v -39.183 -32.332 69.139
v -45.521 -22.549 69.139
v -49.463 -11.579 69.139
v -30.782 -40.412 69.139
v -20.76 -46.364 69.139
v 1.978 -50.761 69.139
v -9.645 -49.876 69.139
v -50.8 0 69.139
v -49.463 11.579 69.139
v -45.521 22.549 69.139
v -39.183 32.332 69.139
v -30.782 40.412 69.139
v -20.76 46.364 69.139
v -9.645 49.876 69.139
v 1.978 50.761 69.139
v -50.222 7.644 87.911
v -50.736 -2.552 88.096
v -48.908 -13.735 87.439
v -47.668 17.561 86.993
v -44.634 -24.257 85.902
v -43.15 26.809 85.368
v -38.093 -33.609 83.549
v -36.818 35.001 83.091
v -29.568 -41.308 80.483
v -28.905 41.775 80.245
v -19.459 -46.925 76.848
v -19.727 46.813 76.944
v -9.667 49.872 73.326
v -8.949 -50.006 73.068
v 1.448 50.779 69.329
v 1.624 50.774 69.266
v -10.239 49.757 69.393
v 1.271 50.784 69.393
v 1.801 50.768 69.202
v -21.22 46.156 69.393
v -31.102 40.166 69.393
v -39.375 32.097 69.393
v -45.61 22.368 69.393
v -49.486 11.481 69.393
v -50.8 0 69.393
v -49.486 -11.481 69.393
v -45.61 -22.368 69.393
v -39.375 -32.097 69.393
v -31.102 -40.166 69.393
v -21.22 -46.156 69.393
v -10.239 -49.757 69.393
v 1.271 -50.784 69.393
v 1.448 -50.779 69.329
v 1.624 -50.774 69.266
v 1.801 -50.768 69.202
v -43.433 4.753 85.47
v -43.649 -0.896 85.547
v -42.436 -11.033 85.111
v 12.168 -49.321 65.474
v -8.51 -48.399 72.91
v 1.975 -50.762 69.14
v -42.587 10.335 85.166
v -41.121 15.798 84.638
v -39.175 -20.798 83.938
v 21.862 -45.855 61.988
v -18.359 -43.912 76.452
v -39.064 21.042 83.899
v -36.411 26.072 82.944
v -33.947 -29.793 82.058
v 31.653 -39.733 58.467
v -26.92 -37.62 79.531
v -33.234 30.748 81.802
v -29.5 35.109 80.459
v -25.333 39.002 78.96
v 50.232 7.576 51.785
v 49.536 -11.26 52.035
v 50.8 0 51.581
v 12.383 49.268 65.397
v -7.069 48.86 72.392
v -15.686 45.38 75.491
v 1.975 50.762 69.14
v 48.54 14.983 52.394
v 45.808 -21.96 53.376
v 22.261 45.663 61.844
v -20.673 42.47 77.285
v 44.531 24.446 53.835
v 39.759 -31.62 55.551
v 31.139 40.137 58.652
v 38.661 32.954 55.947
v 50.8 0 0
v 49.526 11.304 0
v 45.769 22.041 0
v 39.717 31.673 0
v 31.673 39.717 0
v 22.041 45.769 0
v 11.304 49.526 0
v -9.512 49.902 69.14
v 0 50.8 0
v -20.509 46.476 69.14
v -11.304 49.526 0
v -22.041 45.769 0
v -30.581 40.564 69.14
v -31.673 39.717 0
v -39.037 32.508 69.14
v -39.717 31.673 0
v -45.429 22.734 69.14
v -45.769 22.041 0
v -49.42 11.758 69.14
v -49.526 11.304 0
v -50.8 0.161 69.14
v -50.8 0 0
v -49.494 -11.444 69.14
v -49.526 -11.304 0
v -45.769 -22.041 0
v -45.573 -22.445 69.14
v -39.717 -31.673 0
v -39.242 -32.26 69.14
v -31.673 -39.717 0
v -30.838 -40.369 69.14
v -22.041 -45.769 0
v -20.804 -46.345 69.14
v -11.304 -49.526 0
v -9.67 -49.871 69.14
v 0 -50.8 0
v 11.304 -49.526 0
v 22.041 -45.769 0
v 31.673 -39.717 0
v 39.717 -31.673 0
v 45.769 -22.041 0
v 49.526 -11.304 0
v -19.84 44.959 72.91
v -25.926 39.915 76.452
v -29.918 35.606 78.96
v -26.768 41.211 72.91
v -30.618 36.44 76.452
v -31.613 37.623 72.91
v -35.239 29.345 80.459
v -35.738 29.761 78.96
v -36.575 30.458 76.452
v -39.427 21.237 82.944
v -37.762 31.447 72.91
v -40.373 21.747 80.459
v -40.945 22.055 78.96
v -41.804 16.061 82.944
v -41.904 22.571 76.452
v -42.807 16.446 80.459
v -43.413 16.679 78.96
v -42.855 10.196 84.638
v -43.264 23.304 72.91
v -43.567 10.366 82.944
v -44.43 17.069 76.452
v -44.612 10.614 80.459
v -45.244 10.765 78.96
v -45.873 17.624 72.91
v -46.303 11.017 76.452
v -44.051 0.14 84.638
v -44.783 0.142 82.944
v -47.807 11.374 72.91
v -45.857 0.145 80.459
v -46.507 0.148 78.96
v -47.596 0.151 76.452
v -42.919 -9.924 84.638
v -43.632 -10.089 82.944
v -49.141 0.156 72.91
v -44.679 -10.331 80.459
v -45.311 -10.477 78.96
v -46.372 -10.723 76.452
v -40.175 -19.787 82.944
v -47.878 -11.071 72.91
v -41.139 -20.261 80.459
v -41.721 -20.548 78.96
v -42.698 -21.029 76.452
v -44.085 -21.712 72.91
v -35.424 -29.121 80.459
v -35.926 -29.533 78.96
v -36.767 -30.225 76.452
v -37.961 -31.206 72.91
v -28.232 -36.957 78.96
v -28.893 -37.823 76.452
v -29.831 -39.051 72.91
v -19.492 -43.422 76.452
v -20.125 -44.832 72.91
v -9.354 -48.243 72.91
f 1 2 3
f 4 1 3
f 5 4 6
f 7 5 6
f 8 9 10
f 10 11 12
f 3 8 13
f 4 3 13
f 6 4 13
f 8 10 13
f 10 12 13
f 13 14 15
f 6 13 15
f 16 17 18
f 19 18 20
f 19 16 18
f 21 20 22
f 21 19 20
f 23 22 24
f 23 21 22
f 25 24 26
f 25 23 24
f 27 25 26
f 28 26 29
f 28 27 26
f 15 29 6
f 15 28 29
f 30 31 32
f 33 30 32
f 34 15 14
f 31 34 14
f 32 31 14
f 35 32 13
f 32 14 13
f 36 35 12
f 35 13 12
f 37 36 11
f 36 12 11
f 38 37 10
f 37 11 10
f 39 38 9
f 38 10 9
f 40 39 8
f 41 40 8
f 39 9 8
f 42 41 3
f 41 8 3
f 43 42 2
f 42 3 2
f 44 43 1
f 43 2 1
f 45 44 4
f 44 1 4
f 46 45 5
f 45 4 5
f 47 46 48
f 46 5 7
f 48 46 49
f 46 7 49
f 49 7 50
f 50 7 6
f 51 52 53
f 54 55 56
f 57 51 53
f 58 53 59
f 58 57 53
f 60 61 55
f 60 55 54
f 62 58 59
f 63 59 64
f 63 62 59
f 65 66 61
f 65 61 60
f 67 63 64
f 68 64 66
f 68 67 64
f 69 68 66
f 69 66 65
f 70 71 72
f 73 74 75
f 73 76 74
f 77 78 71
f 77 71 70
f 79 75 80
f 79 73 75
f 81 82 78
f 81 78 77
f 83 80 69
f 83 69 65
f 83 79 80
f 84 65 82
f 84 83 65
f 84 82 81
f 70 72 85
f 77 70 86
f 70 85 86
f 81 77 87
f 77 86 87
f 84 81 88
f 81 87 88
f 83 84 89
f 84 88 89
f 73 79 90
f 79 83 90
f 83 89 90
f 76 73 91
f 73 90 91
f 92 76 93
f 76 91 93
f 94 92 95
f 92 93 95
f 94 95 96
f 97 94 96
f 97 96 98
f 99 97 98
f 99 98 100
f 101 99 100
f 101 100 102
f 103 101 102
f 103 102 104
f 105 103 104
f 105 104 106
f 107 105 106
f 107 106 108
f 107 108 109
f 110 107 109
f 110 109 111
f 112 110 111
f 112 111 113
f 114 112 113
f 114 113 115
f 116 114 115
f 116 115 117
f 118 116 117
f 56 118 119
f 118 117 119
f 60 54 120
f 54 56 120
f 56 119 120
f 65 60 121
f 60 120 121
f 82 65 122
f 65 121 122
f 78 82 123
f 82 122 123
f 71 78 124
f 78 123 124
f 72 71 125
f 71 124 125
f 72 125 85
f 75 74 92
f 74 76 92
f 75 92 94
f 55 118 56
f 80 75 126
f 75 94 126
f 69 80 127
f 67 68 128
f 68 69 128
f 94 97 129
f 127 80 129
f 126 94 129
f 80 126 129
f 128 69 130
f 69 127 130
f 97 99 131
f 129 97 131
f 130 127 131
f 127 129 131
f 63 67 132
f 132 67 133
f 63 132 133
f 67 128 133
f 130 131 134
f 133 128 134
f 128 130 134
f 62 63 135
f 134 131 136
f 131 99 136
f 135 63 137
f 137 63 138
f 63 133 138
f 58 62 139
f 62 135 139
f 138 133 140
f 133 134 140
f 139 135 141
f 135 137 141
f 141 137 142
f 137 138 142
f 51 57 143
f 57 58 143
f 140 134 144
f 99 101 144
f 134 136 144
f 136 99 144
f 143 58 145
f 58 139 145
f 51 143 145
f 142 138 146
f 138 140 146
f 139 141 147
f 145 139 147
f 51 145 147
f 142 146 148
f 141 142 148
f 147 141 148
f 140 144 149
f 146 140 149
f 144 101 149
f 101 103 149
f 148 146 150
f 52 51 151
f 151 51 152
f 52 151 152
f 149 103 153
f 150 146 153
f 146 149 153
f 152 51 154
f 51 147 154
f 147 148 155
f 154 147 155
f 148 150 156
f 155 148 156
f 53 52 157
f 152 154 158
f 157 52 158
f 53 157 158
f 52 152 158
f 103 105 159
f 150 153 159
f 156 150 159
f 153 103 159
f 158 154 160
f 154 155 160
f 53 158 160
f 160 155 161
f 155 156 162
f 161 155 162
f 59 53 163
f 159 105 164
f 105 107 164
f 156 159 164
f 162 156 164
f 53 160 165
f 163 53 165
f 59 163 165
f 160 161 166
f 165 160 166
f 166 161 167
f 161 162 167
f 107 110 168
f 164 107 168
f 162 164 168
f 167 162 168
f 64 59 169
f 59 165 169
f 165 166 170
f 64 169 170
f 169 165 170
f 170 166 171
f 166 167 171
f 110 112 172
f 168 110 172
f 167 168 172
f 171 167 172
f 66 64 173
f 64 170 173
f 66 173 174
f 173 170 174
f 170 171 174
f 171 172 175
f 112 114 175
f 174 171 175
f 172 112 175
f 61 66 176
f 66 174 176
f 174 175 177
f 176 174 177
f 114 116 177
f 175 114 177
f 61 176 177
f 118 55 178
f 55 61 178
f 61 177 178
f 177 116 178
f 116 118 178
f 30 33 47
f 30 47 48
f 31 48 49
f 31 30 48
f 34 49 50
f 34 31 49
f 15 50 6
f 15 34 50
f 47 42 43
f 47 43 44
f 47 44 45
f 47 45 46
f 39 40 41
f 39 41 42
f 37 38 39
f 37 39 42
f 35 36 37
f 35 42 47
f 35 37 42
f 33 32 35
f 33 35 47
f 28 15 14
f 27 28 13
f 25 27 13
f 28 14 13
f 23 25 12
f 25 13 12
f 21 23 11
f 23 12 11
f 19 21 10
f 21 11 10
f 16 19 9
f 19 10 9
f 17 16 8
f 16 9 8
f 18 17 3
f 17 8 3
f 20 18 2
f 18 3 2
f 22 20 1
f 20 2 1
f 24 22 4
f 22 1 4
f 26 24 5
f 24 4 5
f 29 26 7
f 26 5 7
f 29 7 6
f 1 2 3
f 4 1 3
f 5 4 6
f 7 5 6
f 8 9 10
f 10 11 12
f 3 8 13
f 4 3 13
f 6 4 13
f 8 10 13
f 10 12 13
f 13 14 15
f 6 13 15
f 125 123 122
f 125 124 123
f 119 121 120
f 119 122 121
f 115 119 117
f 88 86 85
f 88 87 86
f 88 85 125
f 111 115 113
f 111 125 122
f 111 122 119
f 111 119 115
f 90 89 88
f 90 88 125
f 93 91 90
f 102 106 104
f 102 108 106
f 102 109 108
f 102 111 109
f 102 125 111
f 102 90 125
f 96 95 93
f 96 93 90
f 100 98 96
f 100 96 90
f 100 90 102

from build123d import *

# Parameters (mm, degrees)
F4_R           = 164.6055242693
F4_R_2         = 50.8
F5_DEPTH       = 228.6
F6_DEPTH       = 76.2
F7_DEPTH       = 76.2
F1_FACE_R      = 50.8
F9_R           = 50.8
F10_DEPTH      = 0.254
F13_R          = 50.8
F14_DEPTH      = 0.254
F15_R          = 50.8
F16_DEPTH      = 88.9
F17_DEPTH      = 76.2010001
F17_DEPTH_BACK = 76.2010001


with BuildPart() as f1:
    # F0 (on Front) → F1 (revolve)
    with BuildSketch(Plane.XZ):
        with BuildLine():
            Line((0, 152.4), (0, 0))
            Line((0, 0), (101.6, 0))
            add(Edge.make_bspline(
                [(0, 152.4), (31.2806190923, 152.6805776894), (58.9061267674, 6.9993138313), (101.6, 0)],
                knots=[0.5, 0.5, 0.5, 0.5, 1, 1, 1, 1], degree=3))
        make_face()
    revolve(axis=Axis((0, 0, 76.2), (0, 0, 1)))

    # F4 (on Top) → F5 (cut)
    with BuildSketch(Plane.XY):
        Circle(F4_R)
        Circle(F4_R_2, mode=Mode.SUBTRACT)
    extrude(amount=F5_DEPTH, mode=Mode.SUBTRACT)



with BuildPart() as f6:
    # F3 (on Front) → F6 (new body, symmetric)
    with BuildSketch(Plane.XZ):
        Polygon((-165.0736852158, 129.2151014842), (194.2285387215, 0), (228.6109409009, 95.6054936726), (-130.6912830364, 224.8205951567), align=None)
    extrude(amount=F6_DEPTH, both=True)


with BuildPart() as f1_1:
    add(f1.part)

    add(f6.part)  # F7 merges F6
    # F3 (on Front) → F7 (join, symmetric)
    with BuildSketch(Plane.XZ):
        Polygon((-165.0736852158, 129.2151014842), (194.2285387215, 0), (228.6109409009, 95.6054936726), (-130.6912830364, 224.8205951567), align=None)
    extrude(amount=F7_DEPTH, both=True)


with BuildPart() as f10:
    # F1_face (on face) + F9 (on offset) → F10 (new body)
    with BuildSketch(Plane(origin=(0, 0, 0), x_dir=(1, 0, 0), z_dir=(0, 0, -1))):
        Circle(F1_FACE_R)
    with BuildSketch(Plane.XY.offset(88.9)):
        Circle(F9_R)
    extrude(amount=F10_DEPTH, dir=(0, 0, -1))


with BuildPart() as f14:
    # F13 (on offset) → F14 (new body)
    with BuildSketch(Plane.XY.offset(69.1388)):
        Circle(F13_R)
    extrude(amount=F14_DEPTH)


with BuildPart() as f16:
    # F15 (on offset) → F16 (new body)
    with BuildSketch(Plane.XY.offset(69.1388)):
        Circle(F15_R)
    extrude(amount=F16_DEPTH)


with BuildPart() as f17_tool:
    # F3 (on Front) → F17 (new body, two sides)
    with BuildSketch(Plane.XZ) as f17_sk:
        Polygon((-165.0736852158, 129.2151014842), (194.2285387215, 0), (228.6109409009, 95.6054936726), (-130.6912830364, 224.8205951567), align=None)
    extrude(amount=-F17_DEPTH)
    extrude(f17_sk.sketch, amount=F17_DEPTH_BACK)


with BuildPart() as f1_2:
    add(f1_1.part)

    # F17: cut by f17_tool
    add(f17_tool.part, mode=Mode.SUBTRACT)


with BuildPart() as f14_1:
    add(f14.part)

    # F17: cut by f17_tool
    add(f17_tool.part, mode=Mode.SUBTRACT)


with BuildPart() as f16_1:
    add(f16.part)

    # F17: cut by f17_tool
    add(f17_tool.part, mode=Mode.SUBTRACT)


solid = Compound([f1_2.part, f14_1.part, f16_1.part])
